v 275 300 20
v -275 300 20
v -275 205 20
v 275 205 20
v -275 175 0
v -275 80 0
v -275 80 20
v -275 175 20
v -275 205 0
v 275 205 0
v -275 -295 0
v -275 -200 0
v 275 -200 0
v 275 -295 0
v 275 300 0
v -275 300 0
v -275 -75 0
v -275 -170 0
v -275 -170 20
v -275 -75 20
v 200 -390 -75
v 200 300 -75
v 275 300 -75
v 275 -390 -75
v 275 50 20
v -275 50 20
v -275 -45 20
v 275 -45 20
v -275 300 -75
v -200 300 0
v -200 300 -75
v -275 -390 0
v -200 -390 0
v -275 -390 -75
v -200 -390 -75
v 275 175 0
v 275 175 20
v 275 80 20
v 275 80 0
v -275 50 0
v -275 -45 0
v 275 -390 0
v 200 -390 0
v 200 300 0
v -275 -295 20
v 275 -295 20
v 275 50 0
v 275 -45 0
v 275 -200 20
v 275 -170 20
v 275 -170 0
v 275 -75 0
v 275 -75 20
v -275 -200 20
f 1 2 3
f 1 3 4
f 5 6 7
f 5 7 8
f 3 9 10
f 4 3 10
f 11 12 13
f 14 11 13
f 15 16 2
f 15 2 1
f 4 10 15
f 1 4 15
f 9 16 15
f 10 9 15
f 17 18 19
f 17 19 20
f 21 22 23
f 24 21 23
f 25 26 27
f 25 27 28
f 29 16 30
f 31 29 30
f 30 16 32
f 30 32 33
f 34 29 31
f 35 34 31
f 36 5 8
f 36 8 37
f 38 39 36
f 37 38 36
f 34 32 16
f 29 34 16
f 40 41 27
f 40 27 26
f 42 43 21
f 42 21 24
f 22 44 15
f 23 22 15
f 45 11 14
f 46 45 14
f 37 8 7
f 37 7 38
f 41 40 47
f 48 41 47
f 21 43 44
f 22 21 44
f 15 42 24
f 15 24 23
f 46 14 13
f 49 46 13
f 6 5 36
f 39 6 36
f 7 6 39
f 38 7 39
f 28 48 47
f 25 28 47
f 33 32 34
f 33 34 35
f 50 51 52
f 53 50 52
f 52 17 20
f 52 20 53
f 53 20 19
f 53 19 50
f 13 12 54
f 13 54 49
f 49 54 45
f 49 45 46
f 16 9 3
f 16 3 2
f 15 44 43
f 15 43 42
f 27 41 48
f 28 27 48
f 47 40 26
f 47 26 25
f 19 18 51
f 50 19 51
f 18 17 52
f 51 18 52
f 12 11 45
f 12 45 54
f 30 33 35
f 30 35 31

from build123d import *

# Parameters (mm, degrees)
F0_W     = 550
F0_H     = 95
F1_DEPTH = 20
F2_W     = 75
F2_H     = 690
F3_DEPTH = 75


with BuildPart() as f1:
    # F0 (on Top) → F1 (new body)
    with BuildSketch(Plane.XY):
        with Locations((0, 252.5)):
            Rectangle(F0_W, F0_H)
        with Locations((0, 127.5)):
            Rectangle(F0_W, F0_H)
        with Locations((0, 2.5)):
            Rectangle(F0_W, F0_H)
        with Locations((0, -122.5)):
            Rectangle(F0_W, F0_H)
        with Locations((0, -247.5)):
            Rectangle(F0_W, F0_H)
    extrude(amount=F1_DEPTH)


with BuildPart() as f3:
    # F2 (on Top) → F3 (new body)
    with BuildSketch(Plane.XY):
        with Locations((237.5, -45)):
            Rectangle(F2_W, F2_H)
        with Locations((-237.5, -45)):
            Rectangle(F2_W, F2_H)
    extrude(amount=-F3_DEPTH)


solid = Compound([f1.part, f3.part])
